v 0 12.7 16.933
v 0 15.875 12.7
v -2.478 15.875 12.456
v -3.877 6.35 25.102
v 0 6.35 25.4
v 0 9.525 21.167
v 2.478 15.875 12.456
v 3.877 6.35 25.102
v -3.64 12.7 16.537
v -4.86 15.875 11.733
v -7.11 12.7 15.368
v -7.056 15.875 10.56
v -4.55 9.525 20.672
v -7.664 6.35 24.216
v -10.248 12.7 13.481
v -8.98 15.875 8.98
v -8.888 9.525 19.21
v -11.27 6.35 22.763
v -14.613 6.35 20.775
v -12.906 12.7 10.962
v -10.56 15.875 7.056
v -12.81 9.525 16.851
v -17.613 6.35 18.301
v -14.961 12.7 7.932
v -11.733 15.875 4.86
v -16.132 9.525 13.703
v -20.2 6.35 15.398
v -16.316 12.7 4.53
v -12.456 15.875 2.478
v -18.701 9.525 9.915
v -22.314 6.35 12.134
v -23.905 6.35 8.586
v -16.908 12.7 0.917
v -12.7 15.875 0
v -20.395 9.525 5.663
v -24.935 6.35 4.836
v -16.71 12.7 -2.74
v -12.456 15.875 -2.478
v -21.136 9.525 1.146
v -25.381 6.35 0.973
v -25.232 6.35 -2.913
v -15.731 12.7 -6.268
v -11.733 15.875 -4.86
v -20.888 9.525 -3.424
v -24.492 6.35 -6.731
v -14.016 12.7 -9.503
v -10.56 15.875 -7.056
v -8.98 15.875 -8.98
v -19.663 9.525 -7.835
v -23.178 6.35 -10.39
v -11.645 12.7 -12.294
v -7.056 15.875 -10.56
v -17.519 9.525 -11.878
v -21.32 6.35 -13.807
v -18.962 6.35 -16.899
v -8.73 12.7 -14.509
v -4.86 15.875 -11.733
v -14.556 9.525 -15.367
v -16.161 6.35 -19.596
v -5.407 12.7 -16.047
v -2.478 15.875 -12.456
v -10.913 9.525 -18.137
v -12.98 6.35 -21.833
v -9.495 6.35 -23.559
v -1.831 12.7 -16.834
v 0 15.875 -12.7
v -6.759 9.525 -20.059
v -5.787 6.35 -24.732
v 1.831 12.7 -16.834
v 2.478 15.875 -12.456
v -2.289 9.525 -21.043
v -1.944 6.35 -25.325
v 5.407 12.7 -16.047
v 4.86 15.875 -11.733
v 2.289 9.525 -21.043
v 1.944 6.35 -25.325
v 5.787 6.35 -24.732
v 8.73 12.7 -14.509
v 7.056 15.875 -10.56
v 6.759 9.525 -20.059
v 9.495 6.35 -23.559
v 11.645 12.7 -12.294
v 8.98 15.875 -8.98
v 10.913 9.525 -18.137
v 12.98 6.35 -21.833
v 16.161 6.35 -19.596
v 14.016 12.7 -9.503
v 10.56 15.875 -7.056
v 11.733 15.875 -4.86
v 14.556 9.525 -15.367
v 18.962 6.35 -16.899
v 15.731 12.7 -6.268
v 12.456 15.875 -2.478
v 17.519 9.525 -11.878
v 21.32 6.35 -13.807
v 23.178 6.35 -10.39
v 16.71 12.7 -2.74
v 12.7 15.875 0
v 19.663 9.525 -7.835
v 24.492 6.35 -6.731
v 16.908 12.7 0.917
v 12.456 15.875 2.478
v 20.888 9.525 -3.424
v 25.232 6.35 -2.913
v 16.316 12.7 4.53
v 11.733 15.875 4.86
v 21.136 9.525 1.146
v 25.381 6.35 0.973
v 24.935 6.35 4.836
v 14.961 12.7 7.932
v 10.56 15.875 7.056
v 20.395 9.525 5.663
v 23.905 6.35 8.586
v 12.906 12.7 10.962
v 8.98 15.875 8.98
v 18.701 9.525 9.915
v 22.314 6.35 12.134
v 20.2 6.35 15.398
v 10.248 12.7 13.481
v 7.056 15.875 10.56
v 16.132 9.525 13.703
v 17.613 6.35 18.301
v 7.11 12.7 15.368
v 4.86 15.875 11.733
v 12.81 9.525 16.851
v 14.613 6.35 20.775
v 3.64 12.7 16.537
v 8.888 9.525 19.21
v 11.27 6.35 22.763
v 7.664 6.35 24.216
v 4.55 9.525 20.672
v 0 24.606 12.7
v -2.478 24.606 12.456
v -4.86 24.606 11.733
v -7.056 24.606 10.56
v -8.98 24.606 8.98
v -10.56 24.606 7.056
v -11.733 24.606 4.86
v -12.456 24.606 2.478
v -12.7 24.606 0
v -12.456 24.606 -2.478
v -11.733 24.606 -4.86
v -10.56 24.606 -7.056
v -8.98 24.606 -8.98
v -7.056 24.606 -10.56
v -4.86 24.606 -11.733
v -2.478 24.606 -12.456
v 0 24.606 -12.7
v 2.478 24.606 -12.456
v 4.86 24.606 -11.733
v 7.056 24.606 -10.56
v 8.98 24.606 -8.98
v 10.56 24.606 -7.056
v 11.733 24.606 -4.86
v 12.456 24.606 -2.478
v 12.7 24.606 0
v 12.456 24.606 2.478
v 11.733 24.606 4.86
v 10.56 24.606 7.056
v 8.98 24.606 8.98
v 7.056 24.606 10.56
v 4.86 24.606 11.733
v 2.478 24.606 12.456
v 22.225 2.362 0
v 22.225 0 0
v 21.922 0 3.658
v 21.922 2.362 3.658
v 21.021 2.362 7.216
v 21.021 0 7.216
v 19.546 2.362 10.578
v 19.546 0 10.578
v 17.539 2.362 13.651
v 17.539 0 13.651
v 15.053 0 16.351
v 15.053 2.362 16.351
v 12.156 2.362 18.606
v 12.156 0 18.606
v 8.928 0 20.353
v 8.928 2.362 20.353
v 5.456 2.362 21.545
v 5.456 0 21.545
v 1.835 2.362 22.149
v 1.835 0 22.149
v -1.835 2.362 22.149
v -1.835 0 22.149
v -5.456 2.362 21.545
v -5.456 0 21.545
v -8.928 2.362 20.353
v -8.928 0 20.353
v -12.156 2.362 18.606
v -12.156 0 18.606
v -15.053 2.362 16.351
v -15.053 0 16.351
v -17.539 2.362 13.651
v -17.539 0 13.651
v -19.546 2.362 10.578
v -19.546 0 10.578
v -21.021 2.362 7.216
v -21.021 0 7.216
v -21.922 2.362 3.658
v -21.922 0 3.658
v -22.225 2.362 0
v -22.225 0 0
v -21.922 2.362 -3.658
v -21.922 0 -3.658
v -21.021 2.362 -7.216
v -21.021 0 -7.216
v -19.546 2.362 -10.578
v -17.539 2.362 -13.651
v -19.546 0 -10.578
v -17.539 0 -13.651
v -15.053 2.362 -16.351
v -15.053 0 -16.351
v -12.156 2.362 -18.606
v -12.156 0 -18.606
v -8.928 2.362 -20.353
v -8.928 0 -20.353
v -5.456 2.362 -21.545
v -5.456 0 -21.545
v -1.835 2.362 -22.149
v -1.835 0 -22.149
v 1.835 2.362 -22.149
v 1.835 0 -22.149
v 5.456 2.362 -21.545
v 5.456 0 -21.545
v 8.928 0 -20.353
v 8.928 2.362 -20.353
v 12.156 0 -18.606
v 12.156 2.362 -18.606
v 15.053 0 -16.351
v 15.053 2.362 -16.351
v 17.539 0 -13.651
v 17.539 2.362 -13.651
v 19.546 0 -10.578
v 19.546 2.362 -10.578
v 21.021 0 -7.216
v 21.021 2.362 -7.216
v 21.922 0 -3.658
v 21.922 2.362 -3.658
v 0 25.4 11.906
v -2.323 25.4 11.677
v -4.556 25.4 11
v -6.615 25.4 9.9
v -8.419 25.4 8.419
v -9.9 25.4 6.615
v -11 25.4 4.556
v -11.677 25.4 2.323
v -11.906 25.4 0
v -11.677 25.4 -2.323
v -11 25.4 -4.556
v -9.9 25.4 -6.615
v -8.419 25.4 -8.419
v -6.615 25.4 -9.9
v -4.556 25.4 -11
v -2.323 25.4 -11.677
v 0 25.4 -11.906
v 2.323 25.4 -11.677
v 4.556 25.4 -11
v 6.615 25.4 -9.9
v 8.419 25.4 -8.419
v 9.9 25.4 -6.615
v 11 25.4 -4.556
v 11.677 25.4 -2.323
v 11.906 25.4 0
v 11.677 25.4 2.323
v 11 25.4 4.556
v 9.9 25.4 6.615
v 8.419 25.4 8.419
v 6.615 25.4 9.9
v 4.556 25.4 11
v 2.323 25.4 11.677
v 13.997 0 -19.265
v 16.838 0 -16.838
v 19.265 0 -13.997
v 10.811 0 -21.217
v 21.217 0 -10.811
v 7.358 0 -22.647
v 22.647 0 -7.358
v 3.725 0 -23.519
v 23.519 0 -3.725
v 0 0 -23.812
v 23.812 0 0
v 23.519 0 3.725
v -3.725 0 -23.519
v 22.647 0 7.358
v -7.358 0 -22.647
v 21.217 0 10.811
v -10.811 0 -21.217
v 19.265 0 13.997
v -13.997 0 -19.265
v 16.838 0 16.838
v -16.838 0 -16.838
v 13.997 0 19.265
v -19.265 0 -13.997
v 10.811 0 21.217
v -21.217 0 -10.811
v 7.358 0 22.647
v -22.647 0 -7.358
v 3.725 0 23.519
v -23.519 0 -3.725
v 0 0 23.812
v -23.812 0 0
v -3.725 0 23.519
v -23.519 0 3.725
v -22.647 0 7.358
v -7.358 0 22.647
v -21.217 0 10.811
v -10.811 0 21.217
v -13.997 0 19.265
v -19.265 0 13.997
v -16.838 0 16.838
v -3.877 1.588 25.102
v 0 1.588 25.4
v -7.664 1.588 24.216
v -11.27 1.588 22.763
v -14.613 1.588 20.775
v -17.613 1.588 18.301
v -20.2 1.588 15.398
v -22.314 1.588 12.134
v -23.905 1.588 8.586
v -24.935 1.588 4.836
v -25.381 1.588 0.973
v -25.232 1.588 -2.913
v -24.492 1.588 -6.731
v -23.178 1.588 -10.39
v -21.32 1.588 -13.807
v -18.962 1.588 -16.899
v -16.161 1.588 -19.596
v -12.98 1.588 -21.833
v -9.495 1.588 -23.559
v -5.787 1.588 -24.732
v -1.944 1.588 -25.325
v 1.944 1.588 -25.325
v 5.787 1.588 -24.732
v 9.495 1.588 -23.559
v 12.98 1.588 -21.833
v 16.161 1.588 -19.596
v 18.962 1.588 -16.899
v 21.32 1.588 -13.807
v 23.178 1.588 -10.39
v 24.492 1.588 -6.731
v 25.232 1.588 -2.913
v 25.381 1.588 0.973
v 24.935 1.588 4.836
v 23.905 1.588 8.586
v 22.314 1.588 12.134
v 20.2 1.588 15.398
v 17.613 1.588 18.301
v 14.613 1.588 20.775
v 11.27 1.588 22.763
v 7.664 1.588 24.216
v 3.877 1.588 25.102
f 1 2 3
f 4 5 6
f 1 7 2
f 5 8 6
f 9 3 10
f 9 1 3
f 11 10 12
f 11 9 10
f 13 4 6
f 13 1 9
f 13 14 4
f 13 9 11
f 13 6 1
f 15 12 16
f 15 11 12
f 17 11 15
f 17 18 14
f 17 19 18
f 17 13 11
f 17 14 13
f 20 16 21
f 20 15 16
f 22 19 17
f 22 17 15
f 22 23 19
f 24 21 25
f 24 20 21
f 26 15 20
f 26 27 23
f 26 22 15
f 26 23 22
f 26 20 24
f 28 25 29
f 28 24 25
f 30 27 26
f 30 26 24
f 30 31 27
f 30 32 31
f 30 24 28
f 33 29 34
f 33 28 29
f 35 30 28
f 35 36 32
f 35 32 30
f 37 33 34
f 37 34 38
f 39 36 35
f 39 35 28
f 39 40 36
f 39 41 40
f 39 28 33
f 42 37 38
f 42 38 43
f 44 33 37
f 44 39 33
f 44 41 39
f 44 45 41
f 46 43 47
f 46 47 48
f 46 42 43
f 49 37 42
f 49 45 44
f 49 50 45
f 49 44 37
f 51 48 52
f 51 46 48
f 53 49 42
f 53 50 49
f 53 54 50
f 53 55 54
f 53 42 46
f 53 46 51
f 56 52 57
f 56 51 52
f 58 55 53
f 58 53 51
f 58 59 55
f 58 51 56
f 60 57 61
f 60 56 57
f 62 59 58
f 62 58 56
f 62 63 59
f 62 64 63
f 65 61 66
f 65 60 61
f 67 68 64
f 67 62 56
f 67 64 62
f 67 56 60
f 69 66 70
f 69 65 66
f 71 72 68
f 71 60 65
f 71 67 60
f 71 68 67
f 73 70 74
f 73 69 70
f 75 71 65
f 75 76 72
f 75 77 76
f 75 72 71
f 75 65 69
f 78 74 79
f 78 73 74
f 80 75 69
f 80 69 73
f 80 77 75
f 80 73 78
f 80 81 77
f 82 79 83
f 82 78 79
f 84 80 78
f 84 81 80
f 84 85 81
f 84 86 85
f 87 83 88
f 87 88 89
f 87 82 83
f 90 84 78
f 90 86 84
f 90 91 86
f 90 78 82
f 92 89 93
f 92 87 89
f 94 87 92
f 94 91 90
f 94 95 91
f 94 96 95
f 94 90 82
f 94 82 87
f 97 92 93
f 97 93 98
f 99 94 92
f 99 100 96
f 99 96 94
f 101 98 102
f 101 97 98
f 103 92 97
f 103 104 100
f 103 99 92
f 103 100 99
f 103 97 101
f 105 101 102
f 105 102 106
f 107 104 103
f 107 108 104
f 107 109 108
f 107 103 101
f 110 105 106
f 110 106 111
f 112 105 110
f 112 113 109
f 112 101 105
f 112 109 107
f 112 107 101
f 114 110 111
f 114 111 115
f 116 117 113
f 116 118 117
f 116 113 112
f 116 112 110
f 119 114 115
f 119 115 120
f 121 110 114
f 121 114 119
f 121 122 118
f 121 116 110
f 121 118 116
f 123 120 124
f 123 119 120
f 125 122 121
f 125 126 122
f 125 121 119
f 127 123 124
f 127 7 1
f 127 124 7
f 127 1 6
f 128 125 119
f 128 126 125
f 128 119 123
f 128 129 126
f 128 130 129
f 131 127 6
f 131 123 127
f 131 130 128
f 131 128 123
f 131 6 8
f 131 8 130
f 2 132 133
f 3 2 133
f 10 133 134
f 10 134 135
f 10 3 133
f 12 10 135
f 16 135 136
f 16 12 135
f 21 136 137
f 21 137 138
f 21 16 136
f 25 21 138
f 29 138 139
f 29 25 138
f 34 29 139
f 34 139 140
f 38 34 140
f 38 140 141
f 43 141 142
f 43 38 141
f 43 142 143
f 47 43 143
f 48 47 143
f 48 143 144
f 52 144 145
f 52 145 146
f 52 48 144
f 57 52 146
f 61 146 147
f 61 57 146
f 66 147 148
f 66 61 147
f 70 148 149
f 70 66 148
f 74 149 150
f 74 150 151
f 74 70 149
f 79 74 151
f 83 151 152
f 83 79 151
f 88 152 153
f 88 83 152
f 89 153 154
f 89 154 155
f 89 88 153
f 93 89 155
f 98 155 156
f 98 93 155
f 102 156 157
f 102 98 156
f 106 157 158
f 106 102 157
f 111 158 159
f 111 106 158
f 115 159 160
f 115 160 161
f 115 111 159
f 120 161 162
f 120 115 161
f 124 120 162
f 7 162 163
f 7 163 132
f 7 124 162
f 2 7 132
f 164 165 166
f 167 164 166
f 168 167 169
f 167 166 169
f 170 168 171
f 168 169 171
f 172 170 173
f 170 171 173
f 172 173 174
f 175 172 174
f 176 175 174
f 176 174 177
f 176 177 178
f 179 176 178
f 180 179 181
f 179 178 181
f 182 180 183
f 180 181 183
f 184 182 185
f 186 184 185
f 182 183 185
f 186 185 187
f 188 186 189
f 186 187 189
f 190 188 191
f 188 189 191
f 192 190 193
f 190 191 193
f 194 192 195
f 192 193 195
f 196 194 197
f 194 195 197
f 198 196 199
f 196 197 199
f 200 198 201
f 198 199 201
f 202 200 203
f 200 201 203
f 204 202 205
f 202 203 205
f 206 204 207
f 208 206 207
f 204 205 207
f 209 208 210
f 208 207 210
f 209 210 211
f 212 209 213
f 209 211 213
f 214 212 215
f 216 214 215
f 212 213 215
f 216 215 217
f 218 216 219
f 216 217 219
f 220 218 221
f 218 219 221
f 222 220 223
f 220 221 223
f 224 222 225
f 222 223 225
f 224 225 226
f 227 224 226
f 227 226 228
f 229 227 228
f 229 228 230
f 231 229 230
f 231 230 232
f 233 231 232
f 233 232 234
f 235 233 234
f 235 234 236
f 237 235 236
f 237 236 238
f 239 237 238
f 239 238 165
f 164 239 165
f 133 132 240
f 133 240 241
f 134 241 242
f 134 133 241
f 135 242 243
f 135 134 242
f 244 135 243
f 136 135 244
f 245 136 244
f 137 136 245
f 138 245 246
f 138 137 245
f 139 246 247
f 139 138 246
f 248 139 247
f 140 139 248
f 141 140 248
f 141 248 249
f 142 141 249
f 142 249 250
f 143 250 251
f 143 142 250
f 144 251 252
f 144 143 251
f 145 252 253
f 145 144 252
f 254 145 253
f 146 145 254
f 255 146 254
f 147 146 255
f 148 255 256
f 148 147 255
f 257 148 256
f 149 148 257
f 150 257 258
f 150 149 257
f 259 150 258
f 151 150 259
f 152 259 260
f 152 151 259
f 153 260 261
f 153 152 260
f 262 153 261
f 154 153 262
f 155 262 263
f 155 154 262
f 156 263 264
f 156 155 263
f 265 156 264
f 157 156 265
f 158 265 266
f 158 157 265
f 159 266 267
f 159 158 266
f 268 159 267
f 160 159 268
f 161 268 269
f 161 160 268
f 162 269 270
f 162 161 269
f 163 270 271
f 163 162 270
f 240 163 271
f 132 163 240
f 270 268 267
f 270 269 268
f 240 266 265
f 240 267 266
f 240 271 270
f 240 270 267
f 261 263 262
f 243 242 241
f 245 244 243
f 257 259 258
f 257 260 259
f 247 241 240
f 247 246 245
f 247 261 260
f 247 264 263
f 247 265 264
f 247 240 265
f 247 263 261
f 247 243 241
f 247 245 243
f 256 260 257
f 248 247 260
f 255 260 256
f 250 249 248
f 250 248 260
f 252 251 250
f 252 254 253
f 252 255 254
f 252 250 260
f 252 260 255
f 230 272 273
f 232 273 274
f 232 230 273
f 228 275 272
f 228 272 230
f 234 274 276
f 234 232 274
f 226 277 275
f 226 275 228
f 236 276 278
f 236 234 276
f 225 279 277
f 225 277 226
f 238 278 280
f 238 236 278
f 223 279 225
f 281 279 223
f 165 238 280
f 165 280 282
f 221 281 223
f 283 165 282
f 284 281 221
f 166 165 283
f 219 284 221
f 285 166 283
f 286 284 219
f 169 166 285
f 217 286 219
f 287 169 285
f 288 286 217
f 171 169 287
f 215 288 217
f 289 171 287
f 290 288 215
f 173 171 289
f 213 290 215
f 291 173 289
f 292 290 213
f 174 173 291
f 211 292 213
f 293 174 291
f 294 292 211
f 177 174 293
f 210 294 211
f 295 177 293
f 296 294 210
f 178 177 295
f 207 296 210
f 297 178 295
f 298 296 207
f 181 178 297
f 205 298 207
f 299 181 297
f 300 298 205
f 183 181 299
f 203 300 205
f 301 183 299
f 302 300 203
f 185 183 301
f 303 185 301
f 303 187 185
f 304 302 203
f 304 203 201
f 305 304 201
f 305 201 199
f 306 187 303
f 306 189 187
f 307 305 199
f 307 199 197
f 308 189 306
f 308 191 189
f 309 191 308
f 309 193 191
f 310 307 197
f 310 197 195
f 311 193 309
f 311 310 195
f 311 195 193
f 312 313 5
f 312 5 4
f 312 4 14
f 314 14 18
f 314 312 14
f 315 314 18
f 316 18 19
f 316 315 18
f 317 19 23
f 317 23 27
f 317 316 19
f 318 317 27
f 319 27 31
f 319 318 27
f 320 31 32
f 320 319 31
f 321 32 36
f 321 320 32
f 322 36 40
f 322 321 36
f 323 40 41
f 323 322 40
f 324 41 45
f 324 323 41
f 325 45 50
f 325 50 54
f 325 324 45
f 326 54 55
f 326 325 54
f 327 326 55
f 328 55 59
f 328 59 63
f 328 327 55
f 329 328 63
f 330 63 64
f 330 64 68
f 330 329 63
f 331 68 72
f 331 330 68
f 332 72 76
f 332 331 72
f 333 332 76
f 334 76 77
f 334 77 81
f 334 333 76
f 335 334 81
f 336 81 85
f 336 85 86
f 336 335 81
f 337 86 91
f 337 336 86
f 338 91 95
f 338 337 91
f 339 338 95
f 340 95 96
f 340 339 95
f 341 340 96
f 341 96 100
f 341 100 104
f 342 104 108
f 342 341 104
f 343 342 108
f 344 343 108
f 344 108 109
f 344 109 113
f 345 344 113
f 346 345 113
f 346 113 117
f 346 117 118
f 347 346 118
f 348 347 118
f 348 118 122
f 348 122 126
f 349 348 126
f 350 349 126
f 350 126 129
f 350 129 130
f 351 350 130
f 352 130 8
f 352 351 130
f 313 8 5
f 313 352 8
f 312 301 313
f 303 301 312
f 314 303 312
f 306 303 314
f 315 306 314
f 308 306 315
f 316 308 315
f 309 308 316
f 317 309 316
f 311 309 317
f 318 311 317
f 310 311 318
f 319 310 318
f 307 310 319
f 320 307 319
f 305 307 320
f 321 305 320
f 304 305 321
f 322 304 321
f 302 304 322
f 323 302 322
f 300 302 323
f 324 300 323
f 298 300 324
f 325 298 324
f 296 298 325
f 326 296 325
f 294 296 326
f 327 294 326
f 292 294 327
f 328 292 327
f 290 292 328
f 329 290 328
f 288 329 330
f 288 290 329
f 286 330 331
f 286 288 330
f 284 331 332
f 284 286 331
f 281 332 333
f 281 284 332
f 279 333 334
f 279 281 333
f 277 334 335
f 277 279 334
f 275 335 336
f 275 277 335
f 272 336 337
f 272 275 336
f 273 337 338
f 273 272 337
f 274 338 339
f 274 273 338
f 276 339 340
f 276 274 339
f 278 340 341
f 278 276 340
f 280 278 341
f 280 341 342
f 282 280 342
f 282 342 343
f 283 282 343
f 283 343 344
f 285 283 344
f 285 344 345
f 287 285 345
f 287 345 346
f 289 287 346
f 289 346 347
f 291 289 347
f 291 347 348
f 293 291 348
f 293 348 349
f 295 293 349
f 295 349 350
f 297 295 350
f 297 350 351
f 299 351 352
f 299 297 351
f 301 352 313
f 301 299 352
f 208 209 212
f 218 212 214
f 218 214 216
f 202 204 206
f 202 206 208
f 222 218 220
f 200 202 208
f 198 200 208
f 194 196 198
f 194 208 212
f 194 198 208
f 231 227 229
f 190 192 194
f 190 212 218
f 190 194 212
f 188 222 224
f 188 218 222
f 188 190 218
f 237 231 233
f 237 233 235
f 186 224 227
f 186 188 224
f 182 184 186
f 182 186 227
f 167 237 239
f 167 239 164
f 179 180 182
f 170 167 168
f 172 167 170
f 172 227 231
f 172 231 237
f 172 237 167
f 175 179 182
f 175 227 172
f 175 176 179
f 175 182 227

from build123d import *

# Parameters (mm, degrees)
F2_SIZE  = 0.79375
F3_SIZE  = 1.5875
F4_R     = 22.225
F5_DEPTH = 2.3622


with BuildPart() as f1:
    # F0 (on Right) → F1 (revolve)
    with BuildSketch(Plane.YZ):
        Polygon((0, 25.4), (0, 0), (25.4, 0), (25.4, 12.7), (15.875, 12.7), (6.35, 25.4), align=None)
    revolve(axis=Axis((0, 12.7, 0), (0, -1, 0)))

    # F2
    f2_edges = [f1.edges().sort_by_distance(p)[0] for p in [
        (0, 25.4, -12.7),
    ]]
    chamfer(f2_edges, length=F2_SIZE)

    # F3
    f3_edges = [f1.edges().sort_by_distance(p)[0] for p in [
        (0, 0, -25.4),
    ]]
    chamfer(f3_edges, length=F3_SIZE)

    # F4 (on face) → F5 (cut)
    with BuildSketch(Plane.XZ):
        Circle(F4_R)
    extrude(amount=-F5_DEPTH, mode=Mode.SUBTRACT)


solid = f1.part
